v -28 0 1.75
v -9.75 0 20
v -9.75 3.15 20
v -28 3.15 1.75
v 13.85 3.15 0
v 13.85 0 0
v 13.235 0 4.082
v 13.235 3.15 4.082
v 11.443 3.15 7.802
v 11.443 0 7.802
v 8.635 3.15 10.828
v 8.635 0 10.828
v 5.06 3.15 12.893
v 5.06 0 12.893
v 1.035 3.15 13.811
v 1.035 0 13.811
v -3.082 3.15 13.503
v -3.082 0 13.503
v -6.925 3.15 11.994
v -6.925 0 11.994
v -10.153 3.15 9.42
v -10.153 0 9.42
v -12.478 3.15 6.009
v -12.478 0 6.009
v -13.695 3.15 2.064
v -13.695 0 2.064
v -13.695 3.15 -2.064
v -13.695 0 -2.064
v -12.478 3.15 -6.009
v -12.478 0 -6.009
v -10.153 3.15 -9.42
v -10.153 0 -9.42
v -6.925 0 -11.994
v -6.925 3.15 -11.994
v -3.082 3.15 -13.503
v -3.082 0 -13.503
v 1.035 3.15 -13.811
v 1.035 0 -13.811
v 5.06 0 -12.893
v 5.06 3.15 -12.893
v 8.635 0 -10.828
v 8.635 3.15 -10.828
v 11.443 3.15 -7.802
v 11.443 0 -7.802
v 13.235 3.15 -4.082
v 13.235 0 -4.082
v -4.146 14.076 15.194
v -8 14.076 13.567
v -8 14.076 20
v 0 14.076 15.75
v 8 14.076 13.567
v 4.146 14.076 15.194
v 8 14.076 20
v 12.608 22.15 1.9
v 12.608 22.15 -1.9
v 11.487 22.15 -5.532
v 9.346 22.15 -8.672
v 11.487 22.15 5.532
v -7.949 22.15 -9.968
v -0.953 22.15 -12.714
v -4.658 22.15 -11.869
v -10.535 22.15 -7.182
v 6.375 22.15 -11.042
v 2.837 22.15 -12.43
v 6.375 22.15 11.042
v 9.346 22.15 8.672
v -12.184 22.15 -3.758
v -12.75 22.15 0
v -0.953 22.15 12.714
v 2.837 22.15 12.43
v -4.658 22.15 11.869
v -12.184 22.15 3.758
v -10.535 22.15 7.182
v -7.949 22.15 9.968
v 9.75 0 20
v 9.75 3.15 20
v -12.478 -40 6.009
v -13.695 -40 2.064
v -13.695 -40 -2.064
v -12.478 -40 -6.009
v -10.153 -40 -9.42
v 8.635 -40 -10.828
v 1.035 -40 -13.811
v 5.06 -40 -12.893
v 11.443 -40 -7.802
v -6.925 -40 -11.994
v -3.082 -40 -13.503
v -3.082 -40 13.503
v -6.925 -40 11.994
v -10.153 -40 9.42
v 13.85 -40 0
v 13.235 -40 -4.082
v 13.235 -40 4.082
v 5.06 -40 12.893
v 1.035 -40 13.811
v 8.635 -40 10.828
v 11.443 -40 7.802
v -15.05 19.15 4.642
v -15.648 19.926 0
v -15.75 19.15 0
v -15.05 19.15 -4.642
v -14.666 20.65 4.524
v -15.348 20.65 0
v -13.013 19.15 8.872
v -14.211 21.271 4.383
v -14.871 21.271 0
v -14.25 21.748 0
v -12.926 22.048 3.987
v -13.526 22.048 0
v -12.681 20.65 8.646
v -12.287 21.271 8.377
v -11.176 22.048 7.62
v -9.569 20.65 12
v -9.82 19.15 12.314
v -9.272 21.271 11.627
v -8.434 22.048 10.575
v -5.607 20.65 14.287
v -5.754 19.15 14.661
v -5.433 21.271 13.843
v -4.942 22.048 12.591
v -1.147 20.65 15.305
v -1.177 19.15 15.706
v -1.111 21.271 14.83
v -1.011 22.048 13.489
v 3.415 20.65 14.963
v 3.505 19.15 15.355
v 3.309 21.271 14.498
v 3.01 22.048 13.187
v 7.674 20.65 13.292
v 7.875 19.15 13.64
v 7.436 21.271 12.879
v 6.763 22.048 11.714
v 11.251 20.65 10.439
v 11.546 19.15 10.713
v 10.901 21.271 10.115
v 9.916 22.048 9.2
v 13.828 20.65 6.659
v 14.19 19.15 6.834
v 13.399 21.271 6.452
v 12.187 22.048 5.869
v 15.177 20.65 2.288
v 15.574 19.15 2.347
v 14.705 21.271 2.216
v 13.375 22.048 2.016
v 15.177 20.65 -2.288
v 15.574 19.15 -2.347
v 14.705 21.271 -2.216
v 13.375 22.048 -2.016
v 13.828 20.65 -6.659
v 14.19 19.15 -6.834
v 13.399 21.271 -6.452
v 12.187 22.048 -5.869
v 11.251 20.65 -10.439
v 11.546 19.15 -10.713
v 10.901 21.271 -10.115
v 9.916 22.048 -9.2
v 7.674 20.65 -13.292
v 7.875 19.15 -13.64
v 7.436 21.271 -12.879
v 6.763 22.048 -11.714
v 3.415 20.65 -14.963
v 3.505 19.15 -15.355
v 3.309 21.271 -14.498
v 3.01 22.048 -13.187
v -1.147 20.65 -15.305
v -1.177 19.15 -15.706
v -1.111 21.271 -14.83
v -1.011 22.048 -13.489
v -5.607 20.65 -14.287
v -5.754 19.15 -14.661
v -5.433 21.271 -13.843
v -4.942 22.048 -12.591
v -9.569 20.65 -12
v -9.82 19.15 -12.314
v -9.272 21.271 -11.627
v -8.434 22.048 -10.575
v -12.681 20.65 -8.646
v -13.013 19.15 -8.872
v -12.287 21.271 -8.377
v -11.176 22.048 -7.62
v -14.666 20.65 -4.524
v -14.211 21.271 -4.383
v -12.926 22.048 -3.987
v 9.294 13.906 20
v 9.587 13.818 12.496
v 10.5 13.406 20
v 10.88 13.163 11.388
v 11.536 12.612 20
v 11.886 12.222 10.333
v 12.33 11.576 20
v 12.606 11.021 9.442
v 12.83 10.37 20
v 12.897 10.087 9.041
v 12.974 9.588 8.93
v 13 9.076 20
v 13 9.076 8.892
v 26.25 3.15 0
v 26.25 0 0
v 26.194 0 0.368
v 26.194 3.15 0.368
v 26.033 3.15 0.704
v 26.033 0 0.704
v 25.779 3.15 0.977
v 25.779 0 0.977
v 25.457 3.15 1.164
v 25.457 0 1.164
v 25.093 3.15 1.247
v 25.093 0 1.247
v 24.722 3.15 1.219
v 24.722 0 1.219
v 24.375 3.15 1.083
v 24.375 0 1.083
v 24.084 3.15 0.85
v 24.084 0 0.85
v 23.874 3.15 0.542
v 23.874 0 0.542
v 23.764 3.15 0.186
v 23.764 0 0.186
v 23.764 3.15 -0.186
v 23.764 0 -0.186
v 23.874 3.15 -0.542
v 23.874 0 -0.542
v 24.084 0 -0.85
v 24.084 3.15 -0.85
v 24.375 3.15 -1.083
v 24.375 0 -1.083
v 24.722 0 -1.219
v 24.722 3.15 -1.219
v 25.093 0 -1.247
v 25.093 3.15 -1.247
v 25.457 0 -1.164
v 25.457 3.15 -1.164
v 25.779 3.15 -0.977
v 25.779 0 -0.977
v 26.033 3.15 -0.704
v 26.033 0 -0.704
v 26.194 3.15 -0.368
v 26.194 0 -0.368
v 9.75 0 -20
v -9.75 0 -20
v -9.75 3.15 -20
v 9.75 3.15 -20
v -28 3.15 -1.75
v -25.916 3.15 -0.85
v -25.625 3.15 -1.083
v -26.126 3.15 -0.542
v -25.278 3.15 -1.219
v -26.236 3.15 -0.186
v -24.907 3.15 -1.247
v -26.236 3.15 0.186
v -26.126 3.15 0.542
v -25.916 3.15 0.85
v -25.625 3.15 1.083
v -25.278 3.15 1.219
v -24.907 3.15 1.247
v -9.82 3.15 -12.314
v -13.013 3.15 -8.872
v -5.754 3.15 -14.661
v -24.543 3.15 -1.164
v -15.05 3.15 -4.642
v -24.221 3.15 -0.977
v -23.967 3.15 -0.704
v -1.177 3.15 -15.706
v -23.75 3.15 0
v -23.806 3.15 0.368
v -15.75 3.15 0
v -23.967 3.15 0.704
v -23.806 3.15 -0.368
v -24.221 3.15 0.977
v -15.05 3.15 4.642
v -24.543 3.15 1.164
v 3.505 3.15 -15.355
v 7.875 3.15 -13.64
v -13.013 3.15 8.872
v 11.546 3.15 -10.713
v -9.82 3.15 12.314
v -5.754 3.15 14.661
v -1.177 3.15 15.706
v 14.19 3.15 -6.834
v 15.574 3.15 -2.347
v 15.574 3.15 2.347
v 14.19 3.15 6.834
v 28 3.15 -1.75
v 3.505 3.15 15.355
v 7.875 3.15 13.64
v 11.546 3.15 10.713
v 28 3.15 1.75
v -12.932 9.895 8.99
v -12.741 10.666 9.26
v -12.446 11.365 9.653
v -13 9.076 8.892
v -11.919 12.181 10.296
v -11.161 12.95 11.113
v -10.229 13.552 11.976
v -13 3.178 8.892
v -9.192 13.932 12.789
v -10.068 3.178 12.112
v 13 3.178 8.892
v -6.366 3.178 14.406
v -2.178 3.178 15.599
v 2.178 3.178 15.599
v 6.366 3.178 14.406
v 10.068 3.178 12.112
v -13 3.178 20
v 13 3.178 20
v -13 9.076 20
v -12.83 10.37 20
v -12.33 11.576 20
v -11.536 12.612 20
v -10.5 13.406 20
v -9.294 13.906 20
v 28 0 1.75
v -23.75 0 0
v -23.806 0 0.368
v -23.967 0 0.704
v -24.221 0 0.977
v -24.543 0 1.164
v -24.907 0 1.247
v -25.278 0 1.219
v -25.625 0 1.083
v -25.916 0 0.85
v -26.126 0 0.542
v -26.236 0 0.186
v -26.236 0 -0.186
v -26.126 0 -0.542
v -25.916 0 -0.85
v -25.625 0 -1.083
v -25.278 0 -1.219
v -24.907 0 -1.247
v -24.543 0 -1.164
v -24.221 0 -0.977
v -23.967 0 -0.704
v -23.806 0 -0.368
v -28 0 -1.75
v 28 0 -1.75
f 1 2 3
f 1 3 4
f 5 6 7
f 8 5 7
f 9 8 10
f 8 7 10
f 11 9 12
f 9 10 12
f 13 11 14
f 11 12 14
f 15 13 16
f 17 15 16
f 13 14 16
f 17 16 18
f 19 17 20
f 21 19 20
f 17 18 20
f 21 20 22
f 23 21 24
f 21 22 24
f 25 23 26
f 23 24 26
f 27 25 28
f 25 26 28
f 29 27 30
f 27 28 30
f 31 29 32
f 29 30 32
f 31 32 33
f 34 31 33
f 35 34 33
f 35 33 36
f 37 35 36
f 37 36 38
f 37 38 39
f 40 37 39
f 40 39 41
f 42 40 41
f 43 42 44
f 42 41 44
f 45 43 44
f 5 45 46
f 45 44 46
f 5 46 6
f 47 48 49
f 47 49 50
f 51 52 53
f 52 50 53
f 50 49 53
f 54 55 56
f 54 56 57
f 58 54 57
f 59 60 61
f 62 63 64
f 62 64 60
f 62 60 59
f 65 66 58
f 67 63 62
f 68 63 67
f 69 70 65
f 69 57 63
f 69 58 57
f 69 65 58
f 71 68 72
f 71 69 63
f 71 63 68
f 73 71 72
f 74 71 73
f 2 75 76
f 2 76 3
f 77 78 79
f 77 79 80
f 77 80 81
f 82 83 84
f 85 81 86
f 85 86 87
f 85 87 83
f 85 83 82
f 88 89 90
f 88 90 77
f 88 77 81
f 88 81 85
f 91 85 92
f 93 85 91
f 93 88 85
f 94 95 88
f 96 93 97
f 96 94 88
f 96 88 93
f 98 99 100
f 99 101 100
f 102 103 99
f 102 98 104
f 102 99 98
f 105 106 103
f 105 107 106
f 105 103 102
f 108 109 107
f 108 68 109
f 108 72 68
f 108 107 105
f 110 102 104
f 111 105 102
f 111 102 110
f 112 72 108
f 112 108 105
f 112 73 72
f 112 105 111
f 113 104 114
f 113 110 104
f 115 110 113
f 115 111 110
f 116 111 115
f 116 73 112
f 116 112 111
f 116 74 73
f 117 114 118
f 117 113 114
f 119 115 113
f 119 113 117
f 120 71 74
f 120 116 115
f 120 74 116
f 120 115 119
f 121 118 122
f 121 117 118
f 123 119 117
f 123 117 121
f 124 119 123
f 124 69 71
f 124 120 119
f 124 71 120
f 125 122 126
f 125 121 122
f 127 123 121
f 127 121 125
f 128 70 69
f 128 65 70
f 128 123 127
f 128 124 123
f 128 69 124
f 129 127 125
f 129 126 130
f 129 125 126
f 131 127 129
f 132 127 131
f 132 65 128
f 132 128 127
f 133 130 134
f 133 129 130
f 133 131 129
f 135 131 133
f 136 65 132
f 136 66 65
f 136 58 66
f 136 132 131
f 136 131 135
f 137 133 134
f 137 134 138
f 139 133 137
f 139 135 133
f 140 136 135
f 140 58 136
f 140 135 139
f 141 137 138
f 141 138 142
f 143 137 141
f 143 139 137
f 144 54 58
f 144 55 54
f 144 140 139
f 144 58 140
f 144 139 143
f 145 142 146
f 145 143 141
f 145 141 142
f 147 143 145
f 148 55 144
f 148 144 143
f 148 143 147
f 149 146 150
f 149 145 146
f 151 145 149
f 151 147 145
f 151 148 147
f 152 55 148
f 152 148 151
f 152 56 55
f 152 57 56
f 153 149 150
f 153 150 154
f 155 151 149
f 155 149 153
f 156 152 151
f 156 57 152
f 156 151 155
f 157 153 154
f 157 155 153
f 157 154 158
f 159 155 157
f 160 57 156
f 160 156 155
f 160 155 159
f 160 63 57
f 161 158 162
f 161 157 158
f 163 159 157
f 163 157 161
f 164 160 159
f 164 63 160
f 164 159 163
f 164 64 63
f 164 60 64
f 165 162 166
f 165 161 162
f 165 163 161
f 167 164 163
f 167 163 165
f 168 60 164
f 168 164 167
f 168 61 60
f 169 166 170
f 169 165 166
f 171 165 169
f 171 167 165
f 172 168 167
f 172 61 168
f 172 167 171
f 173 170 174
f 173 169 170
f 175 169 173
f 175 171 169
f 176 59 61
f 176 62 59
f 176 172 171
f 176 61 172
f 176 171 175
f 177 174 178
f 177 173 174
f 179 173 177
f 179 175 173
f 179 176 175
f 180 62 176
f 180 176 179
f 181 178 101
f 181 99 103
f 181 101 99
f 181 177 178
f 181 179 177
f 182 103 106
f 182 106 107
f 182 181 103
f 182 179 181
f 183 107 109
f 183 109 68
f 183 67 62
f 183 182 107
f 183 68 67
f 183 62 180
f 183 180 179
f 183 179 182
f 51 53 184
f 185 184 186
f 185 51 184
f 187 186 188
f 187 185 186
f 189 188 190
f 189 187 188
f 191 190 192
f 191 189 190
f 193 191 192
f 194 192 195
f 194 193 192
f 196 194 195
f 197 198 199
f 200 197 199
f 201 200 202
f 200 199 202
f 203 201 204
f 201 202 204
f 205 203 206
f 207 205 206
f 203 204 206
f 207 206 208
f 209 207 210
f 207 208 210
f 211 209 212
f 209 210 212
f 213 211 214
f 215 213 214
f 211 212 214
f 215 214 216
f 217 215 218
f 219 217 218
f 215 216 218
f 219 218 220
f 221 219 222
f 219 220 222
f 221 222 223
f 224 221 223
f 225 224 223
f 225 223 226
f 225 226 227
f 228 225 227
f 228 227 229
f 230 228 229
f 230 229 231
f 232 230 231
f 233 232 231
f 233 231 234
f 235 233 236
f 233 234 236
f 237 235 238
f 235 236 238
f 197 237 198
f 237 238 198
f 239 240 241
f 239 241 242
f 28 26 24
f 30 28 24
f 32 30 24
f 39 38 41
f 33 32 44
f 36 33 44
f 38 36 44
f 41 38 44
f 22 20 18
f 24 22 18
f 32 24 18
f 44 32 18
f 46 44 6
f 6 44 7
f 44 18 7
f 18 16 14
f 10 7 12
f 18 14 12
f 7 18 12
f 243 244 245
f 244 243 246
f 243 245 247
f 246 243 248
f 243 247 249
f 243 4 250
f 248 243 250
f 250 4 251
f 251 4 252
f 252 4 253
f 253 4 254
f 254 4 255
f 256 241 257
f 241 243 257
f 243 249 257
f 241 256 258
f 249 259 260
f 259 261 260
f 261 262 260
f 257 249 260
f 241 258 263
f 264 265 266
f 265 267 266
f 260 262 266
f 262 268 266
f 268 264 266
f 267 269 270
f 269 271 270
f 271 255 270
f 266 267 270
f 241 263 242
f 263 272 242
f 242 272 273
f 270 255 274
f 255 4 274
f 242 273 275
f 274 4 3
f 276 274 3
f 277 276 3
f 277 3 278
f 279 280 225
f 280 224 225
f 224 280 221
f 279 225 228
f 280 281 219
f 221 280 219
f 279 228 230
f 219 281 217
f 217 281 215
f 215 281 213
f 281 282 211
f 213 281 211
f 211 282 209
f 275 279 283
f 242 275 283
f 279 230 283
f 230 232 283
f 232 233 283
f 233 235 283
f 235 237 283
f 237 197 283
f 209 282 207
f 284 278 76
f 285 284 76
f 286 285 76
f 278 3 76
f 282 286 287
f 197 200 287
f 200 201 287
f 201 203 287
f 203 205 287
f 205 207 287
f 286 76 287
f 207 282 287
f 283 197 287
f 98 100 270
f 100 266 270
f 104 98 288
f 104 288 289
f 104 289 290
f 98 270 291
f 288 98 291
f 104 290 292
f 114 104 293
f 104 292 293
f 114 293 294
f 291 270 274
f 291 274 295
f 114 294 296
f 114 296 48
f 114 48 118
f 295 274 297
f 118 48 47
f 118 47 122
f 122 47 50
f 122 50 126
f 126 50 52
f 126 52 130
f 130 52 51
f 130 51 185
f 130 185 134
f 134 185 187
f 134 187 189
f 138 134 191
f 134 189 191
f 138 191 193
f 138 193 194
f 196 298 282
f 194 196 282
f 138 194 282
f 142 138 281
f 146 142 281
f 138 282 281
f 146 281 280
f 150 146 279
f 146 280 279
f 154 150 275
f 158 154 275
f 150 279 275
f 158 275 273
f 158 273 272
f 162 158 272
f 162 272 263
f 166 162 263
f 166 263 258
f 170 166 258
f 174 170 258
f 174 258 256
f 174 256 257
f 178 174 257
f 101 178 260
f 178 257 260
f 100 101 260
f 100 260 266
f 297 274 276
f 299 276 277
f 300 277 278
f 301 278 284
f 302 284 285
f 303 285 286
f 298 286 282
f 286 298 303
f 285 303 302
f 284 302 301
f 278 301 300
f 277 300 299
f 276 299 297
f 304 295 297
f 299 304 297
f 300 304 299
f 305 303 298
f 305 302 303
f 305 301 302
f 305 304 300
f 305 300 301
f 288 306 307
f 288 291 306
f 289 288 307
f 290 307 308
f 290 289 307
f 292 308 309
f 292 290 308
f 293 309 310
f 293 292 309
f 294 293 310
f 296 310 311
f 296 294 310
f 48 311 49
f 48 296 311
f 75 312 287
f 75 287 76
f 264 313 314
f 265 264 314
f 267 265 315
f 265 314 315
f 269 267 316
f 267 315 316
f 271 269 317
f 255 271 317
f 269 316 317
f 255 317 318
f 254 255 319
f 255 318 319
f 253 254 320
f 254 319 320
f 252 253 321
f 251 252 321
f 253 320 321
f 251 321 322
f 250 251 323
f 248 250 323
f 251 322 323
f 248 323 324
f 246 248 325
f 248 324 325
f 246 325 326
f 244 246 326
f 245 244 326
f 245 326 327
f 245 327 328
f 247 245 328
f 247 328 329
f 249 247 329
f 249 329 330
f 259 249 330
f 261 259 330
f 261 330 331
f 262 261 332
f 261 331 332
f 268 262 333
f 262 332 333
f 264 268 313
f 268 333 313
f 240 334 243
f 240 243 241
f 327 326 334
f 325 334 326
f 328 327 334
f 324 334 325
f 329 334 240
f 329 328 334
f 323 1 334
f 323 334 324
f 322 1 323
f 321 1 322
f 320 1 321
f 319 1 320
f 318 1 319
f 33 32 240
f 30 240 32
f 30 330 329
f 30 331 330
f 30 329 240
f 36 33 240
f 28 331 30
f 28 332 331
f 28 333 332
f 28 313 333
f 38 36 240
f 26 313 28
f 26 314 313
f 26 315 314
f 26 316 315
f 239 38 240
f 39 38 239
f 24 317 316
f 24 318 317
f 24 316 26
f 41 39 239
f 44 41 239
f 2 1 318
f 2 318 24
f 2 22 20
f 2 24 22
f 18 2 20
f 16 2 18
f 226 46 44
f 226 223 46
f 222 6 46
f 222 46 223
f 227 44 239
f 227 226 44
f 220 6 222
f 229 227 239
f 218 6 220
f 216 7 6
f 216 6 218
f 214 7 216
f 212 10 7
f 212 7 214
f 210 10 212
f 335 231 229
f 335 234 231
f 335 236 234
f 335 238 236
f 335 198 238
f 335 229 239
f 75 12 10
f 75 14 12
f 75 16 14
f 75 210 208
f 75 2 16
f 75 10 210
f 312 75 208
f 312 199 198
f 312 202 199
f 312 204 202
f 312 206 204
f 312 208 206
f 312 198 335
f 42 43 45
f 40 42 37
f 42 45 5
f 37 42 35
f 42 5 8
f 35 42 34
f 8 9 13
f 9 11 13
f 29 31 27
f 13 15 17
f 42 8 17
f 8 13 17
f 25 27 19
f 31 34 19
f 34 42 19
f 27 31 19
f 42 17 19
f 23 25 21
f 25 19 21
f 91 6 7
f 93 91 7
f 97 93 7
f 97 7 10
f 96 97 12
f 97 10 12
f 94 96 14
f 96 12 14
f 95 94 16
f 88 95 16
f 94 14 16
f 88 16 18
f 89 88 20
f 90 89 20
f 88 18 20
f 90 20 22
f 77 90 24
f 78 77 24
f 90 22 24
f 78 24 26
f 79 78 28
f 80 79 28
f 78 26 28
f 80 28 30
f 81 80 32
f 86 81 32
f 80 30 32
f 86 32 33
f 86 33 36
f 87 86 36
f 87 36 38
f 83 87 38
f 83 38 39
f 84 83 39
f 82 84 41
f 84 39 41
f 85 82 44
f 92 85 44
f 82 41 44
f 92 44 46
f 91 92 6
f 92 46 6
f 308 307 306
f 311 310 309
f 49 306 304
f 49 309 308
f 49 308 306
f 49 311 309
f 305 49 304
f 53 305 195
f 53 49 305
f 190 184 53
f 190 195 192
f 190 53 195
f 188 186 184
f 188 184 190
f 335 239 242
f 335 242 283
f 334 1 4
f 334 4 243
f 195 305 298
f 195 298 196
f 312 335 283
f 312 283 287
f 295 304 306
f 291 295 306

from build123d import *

# Parameters (mm, degrees)
F0_R     = 1.25
F0_R_2   = 13.85
F1_DEPTH = 3.15
F2_DEPTH = 40
F3_R     = 15.75
F4_DEPTH = 19
F5_R     = 3
F6_W     = 26
F6_H     = 10.898383
F7_DEPTH = 12
F8_R     = 5


with BuildPart() as f1:
    # F0 (on Front) → F1 (new body)
    with BuildSketch(Plane.XZ):
        Polygon((-9.75, 20), (-28, 1.75), (-28, -1.75), (-9.75, -20), (9.75, -20), (28, -1.75), (28, 1.75), (9.75, 20), align=None)
        with Locations((-25, 0)):
            Circle(F0_R, mode=Mode.SUBTRACT)
        Circle(F0_R_2, mode=Mode.SUBTRACT)
        with Locations((25, 0)):
            Circle(F0_R, mode=Mode.SUBTRACT)
    extrude(amount=-F1_DEPTH)

    # F3 (on face) → F4 (join)
    with BuildSketch(Plane(origin=(0, 3.15, 0), x_dir=(-1, 0, 0), z_dir=(0, 1, 0))):
        Circle(F3_R)
    extrude(amount=F4_DEPTH)

    # F5
    f5_edges = [f1.edges().sort_by_distance(p)[0] for p in [
        (15.75, 22.15, 0),
    ]]
    fillet(f5_edges, radius=F5_R)

    # F6 (on face) → F7 (join)
    with BuildSketch(Plane.XY.offset(20)):
        with Locations((0, 8.626893)):
            Rectangle(F6_W, F6_H)
    extrude(amount=-F7_DEPTH)

    # F8
    f8_edges = [f1.edges().sort_by_distance(p)[0] for p in [
        (13, 14.076085, 14.445855),
        (-13, 14.076085, 14.445855),
    ]]
    fillet(f8_edges, radius=F8_R)


with BuildPart() as f2:
    # F0 (on Front) → F2 (new body)
    with BuildSketch(Plane.XZ):
        Circle(F0_R_2)
    extrude(amount=F2_DEPTH)


solid = Compound([f1.part, f2.part])
